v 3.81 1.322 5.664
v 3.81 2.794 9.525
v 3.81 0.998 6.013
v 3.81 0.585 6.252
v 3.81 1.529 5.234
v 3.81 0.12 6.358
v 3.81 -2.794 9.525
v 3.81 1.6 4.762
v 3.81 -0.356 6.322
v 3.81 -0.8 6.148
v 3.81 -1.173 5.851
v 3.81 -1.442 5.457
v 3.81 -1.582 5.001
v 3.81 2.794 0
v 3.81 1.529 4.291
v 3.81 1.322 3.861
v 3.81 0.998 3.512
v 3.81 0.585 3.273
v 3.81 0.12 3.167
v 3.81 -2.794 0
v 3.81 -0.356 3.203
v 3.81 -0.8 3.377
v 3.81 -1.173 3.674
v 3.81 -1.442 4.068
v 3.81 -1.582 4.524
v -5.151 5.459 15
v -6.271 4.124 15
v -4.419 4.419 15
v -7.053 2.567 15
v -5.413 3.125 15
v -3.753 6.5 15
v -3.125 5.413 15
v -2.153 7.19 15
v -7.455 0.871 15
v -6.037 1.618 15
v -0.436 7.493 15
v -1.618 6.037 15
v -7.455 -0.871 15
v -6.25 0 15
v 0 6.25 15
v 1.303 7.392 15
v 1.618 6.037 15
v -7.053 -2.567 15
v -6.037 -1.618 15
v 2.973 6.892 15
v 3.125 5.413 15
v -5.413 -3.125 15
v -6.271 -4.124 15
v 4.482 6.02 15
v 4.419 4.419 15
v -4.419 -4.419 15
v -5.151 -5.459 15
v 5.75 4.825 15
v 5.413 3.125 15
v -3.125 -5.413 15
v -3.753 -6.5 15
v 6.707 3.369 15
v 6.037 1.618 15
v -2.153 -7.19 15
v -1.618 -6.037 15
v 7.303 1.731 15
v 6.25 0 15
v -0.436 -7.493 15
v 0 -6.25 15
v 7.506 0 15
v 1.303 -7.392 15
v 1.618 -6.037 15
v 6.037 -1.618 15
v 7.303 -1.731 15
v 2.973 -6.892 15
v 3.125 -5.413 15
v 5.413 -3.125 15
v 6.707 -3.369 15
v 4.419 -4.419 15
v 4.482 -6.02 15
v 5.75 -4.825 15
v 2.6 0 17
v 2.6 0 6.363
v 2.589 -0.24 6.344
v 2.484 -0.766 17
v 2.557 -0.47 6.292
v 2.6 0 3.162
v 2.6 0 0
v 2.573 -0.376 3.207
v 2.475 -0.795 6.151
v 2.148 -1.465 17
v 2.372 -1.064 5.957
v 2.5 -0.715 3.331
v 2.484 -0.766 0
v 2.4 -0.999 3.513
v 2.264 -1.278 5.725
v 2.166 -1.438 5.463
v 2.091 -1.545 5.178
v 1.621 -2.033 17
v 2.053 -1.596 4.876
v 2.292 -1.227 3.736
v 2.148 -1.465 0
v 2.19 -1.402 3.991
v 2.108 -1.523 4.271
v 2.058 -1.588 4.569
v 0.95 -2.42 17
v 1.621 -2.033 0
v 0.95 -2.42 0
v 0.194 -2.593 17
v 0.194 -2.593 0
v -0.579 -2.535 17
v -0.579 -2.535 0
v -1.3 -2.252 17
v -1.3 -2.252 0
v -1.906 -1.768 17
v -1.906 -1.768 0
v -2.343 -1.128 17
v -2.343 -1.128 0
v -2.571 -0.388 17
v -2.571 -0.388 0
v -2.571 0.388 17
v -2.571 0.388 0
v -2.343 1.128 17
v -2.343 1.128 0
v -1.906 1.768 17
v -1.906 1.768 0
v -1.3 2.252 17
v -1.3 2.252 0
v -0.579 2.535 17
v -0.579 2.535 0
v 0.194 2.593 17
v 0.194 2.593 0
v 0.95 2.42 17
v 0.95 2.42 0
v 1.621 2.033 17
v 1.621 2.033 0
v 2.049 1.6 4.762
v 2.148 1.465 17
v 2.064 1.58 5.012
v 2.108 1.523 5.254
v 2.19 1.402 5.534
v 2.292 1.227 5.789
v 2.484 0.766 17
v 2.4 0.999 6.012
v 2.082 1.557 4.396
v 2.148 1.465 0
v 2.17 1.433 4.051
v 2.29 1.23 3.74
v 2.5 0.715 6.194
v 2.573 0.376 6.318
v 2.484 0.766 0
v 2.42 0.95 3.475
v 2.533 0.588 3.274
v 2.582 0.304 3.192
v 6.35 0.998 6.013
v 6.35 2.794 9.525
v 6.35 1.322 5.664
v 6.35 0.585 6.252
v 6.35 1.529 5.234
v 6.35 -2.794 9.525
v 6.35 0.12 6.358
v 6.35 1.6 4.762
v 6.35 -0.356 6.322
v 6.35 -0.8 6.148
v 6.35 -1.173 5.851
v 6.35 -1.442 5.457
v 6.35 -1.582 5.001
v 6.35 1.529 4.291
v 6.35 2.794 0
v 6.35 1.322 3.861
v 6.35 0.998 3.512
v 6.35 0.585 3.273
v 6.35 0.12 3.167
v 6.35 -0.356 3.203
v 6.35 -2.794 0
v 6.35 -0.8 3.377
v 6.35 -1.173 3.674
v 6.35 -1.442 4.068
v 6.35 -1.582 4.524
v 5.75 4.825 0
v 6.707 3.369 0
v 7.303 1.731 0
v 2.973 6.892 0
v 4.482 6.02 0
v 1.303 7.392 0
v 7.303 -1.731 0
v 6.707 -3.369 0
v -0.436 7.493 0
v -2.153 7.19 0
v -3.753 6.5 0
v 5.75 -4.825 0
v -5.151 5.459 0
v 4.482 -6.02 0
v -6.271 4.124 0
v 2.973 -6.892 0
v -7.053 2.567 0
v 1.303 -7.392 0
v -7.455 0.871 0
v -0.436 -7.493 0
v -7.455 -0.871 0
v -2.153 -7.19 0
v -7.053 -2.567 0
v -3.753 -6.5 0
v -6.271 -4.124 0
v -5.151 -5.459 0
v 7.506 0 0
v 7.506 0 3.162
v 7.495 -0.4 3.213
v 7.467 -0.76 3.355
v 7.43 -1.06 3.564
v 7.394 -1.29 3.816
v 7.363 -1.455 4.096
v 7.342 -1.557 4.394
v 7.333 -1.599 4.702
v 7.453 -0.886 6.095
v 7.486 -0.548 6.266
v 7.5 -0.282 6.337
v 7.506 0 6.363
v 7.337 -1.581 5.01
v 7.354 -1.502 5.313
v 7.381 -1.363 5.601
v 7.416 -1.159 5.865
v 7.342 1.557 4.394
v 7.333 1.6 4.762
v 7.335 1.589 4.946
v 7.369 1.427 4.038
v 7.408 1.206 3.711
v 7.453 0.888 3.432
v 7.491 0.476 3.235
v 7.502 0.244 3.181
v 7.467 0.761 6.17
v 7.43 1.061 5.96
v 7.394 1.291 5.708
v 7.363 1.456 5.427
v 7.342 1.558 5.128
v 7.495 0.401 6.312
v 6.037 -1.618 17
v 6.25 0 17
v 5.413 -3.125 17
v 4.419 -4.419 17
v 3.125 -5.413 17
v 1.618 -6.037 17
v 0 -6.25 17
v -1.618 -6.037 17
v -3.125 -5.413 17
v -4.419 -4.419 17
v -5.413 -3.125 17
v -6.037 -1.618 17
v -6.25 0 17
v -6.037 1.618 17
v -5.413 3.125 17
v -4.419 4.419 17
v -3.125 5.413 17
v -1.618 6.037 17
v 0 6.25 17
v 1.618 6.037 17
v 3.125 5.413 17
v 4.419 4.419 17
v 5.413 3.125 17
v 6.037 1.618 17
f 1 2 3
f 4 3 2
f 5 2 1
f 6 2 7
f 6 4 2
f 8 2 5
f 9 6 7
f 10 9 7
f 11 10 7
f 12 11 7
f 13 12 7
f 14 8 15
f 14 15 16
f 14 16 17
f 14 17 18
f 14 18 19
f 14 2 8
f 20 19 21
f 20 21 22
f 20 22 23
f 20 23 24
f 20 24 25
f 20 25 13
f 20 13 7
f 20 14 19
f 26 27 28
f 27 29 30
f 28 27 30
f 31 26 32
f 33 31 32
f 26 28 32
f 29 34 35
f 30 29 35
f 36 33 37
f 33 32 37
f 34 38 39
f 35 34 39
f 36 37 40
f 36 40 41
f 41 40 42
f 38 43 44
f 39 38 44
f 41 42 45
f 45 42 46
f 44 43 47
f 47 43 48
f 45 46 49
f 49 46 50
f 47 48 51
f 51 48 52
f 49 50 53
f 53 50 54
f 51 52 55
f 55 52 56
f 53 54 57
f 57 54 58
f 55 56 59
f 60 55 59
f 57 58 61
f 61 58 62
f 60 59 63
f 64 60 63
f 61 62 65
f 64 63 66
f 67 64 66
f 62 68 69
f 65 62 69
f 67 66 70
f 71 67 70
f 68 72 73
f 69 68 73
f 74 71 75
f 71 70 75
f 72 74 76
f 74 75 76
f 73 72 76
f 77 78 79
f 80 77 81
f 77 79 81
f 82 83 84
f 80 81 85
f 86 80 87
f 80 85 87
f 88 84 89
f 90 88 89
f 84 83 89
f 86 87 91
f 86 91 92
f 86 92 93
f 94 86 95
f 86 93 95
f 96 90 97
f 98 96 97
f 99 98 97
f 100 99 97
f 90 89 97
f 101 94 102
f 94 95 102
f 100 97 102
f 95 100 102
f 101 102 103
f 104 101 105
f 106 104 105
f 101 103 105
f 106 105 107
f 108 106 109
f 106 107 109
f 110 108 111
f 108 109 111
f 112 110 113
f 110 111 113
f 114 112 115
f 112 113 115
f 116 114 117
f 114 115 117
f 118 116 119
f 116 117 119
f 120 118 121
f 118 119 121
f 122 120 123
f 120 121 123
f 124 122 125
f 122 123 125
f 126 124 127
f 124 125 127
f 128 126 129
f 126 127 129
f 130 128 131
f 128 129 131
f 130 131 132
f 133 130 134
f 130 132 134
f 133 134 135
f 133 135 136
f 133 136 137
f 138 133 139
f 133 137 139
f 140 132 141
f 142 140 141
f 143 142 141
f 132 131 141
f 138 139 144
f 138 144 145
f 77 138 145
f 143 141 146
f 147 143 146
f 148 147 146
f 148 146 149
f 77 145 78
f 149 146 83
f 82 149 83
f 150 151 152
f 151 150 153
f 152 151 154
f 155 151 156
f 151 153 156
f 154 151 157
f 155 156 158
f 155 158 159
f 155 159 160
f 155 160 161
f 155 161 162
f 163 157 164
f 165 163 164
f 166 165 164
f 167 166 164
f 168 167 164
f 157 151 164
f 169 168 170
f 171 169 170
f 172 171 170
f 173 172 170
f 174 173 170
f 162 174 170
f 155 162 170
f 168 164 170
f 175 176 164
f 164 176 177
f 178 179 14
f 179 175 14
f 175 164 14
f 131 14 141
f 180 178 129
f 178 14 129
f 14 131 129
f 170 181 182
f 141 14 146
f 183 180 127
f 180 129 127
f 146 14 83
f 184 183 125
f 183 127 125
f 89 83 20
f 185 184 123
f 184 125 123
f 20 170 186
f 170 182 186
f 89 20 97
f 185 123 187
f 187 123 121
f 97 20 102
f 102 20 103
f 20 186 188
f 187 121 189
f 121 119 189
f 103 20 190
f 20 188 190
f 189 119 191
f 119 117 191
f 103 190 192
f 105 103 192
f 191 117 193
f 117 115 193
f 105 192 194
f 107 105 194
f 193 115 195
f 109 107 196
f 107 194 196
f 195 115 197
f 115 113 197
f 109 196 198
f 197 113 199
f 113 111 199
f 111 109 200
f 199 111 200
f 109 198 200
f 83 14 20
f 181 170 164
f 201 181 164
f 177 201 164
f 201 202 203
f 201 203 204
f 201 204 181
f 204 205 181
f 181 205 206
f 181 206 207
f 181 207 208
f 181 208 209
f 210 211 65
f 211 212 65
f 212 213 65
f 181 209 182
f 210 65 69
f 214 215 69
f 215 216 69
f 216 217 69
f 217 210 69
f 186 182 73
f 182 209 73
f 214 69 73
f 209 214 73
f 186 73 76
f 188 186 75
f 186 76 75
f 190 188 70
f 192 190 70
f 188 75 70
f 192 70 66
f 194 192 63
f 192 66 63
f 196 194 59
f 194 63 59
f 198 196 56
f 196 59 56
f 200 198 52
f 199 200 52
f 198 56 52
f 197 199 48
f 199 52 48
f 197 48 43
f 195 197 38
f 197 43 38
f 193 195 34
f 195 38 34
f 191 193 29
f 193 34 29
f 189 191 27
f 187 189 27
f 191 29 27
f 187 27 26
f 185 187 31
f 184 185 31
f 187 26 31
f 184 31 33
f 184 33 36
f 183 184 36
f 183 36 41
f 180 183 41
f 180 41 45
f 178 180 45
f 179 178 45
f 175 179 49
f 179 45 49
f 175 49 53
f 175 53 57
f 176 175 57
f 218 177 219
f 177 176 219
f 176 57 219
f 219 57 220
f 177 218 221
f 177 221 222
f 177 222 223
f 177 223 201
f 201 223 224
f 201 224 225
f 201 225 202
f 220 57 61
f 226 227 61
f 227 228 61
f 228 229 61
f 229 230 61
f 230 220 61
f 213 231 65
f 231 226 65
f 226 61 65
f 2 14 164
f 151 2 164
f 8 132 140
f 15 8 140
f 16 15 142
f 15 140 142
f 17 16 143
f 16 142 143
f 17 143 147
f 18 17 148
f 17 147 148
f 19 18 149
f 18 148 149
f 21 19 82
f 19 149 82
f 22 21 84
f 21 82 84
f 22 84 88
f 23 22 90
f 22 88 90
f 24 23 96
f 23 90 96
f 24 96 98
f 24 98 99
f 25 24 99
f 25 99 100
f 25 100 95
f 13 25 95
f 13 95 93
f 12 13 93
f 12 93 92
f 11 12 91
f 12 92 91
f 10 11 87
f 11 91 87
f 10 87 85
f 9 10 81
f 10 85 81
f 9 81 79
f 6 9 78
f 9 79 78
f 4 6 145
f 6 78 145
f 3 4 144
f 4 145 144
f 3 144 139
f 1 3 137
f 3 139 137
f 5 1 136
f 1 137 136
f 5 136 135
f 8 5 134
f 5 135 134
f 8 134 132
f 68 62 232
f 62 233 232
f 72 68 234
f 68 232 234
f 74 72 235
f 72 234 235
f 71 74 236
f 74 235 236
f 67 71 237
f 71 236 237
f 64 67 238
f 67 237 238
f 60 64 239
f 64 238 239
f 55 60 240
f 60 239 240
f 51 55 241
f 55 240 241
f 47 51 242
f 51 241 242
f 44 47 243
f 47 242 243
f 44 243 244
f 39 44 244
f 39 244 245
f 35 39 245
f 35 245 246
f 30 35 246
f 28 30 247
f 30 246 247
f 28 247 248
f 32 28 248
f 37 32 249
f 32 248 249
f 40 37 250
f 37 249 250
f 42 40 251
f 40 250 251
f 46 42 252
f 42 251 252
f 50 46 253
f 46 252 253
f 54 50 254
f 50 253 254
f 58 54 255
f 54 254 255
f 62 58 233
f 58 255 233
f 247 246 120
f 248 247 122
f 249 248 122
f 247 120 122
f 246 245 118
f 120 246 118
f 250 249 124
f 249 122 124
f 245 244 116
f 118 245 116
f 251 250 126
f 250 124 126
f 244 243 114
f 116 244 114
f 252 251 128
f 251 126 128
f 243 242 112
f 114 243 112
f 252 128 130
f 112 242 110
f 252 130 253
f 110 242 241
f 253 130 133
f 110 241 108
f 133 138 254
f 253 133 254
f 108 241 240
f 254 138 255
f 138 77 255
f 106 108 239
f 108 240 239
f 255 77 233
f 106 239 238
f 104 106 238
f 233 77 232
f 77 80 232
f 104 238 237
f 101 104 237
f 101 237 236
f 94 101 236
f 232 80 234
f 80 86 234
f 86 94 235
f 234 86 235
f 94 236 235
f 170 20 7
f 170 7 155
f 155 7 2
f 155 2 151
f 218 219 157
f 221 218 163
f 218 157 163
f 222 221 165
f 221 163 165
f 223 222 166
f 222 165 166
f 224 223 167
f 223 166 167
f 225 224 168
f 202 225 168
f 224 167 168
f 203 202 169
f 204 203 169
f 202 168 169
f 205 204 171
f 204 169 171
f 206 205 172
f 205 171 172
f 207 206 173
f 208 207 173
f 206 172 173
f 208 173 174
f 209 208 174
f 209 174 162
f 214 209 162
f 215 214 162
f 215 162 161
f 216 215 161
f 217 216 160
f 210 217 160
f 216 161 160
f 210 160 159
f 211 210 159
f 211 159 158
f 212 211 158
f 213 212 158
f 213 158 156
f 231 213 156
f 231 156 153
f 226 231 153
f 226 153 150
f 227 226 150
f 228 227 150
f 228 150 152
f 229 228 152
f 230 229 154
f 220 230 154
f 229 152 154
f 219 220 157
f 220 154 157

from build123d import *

# Parameters (mm, degrees)
F2_W     = 2.54
F2_H     = 5.588
F3_DEPTH = 9.525
F5_D     = 3.2
F5_DEPTH = 7.5067


with BuildPart() as f1:
    # F0 (on Front) → F1 (revolve)
    with BuildSketch(Plane.XZ):
        Polygon((2.6, 17), (2.6, 0), (7.5057, 0), (7.5057, 15), (6.25, 15), (6.25, 17), align=None)
    revolve(axis=Axis((0, 0, 12.7238426358), (0, 0, -1)))

    # F2 (on face) → F3 (cut)
    with BuildSketch(Plane(origin=(0, 0, 0), x_dir=(1, 0, 0), z_dir=(0, 0, -1))):
        with Locations((5.08, 0)):
            Rectangle(F2_W, F2_H)
    extrude(amount=-F3_DEPTH, mode=Mode.SUBTRACT)

    # F5 (through all, one way)
    with BuildSketch(Plane(origin=(0, 0, 0), x_dir=(0, 1, 0), z_dir=(-1, 0, 0))):
        with Locations((0, -4.7625)):
            Circle(F5_D / 2)
    extrude(amount=-F5_DEPTH, mode=Mode.SUBTRACT)


solid = f1.part
